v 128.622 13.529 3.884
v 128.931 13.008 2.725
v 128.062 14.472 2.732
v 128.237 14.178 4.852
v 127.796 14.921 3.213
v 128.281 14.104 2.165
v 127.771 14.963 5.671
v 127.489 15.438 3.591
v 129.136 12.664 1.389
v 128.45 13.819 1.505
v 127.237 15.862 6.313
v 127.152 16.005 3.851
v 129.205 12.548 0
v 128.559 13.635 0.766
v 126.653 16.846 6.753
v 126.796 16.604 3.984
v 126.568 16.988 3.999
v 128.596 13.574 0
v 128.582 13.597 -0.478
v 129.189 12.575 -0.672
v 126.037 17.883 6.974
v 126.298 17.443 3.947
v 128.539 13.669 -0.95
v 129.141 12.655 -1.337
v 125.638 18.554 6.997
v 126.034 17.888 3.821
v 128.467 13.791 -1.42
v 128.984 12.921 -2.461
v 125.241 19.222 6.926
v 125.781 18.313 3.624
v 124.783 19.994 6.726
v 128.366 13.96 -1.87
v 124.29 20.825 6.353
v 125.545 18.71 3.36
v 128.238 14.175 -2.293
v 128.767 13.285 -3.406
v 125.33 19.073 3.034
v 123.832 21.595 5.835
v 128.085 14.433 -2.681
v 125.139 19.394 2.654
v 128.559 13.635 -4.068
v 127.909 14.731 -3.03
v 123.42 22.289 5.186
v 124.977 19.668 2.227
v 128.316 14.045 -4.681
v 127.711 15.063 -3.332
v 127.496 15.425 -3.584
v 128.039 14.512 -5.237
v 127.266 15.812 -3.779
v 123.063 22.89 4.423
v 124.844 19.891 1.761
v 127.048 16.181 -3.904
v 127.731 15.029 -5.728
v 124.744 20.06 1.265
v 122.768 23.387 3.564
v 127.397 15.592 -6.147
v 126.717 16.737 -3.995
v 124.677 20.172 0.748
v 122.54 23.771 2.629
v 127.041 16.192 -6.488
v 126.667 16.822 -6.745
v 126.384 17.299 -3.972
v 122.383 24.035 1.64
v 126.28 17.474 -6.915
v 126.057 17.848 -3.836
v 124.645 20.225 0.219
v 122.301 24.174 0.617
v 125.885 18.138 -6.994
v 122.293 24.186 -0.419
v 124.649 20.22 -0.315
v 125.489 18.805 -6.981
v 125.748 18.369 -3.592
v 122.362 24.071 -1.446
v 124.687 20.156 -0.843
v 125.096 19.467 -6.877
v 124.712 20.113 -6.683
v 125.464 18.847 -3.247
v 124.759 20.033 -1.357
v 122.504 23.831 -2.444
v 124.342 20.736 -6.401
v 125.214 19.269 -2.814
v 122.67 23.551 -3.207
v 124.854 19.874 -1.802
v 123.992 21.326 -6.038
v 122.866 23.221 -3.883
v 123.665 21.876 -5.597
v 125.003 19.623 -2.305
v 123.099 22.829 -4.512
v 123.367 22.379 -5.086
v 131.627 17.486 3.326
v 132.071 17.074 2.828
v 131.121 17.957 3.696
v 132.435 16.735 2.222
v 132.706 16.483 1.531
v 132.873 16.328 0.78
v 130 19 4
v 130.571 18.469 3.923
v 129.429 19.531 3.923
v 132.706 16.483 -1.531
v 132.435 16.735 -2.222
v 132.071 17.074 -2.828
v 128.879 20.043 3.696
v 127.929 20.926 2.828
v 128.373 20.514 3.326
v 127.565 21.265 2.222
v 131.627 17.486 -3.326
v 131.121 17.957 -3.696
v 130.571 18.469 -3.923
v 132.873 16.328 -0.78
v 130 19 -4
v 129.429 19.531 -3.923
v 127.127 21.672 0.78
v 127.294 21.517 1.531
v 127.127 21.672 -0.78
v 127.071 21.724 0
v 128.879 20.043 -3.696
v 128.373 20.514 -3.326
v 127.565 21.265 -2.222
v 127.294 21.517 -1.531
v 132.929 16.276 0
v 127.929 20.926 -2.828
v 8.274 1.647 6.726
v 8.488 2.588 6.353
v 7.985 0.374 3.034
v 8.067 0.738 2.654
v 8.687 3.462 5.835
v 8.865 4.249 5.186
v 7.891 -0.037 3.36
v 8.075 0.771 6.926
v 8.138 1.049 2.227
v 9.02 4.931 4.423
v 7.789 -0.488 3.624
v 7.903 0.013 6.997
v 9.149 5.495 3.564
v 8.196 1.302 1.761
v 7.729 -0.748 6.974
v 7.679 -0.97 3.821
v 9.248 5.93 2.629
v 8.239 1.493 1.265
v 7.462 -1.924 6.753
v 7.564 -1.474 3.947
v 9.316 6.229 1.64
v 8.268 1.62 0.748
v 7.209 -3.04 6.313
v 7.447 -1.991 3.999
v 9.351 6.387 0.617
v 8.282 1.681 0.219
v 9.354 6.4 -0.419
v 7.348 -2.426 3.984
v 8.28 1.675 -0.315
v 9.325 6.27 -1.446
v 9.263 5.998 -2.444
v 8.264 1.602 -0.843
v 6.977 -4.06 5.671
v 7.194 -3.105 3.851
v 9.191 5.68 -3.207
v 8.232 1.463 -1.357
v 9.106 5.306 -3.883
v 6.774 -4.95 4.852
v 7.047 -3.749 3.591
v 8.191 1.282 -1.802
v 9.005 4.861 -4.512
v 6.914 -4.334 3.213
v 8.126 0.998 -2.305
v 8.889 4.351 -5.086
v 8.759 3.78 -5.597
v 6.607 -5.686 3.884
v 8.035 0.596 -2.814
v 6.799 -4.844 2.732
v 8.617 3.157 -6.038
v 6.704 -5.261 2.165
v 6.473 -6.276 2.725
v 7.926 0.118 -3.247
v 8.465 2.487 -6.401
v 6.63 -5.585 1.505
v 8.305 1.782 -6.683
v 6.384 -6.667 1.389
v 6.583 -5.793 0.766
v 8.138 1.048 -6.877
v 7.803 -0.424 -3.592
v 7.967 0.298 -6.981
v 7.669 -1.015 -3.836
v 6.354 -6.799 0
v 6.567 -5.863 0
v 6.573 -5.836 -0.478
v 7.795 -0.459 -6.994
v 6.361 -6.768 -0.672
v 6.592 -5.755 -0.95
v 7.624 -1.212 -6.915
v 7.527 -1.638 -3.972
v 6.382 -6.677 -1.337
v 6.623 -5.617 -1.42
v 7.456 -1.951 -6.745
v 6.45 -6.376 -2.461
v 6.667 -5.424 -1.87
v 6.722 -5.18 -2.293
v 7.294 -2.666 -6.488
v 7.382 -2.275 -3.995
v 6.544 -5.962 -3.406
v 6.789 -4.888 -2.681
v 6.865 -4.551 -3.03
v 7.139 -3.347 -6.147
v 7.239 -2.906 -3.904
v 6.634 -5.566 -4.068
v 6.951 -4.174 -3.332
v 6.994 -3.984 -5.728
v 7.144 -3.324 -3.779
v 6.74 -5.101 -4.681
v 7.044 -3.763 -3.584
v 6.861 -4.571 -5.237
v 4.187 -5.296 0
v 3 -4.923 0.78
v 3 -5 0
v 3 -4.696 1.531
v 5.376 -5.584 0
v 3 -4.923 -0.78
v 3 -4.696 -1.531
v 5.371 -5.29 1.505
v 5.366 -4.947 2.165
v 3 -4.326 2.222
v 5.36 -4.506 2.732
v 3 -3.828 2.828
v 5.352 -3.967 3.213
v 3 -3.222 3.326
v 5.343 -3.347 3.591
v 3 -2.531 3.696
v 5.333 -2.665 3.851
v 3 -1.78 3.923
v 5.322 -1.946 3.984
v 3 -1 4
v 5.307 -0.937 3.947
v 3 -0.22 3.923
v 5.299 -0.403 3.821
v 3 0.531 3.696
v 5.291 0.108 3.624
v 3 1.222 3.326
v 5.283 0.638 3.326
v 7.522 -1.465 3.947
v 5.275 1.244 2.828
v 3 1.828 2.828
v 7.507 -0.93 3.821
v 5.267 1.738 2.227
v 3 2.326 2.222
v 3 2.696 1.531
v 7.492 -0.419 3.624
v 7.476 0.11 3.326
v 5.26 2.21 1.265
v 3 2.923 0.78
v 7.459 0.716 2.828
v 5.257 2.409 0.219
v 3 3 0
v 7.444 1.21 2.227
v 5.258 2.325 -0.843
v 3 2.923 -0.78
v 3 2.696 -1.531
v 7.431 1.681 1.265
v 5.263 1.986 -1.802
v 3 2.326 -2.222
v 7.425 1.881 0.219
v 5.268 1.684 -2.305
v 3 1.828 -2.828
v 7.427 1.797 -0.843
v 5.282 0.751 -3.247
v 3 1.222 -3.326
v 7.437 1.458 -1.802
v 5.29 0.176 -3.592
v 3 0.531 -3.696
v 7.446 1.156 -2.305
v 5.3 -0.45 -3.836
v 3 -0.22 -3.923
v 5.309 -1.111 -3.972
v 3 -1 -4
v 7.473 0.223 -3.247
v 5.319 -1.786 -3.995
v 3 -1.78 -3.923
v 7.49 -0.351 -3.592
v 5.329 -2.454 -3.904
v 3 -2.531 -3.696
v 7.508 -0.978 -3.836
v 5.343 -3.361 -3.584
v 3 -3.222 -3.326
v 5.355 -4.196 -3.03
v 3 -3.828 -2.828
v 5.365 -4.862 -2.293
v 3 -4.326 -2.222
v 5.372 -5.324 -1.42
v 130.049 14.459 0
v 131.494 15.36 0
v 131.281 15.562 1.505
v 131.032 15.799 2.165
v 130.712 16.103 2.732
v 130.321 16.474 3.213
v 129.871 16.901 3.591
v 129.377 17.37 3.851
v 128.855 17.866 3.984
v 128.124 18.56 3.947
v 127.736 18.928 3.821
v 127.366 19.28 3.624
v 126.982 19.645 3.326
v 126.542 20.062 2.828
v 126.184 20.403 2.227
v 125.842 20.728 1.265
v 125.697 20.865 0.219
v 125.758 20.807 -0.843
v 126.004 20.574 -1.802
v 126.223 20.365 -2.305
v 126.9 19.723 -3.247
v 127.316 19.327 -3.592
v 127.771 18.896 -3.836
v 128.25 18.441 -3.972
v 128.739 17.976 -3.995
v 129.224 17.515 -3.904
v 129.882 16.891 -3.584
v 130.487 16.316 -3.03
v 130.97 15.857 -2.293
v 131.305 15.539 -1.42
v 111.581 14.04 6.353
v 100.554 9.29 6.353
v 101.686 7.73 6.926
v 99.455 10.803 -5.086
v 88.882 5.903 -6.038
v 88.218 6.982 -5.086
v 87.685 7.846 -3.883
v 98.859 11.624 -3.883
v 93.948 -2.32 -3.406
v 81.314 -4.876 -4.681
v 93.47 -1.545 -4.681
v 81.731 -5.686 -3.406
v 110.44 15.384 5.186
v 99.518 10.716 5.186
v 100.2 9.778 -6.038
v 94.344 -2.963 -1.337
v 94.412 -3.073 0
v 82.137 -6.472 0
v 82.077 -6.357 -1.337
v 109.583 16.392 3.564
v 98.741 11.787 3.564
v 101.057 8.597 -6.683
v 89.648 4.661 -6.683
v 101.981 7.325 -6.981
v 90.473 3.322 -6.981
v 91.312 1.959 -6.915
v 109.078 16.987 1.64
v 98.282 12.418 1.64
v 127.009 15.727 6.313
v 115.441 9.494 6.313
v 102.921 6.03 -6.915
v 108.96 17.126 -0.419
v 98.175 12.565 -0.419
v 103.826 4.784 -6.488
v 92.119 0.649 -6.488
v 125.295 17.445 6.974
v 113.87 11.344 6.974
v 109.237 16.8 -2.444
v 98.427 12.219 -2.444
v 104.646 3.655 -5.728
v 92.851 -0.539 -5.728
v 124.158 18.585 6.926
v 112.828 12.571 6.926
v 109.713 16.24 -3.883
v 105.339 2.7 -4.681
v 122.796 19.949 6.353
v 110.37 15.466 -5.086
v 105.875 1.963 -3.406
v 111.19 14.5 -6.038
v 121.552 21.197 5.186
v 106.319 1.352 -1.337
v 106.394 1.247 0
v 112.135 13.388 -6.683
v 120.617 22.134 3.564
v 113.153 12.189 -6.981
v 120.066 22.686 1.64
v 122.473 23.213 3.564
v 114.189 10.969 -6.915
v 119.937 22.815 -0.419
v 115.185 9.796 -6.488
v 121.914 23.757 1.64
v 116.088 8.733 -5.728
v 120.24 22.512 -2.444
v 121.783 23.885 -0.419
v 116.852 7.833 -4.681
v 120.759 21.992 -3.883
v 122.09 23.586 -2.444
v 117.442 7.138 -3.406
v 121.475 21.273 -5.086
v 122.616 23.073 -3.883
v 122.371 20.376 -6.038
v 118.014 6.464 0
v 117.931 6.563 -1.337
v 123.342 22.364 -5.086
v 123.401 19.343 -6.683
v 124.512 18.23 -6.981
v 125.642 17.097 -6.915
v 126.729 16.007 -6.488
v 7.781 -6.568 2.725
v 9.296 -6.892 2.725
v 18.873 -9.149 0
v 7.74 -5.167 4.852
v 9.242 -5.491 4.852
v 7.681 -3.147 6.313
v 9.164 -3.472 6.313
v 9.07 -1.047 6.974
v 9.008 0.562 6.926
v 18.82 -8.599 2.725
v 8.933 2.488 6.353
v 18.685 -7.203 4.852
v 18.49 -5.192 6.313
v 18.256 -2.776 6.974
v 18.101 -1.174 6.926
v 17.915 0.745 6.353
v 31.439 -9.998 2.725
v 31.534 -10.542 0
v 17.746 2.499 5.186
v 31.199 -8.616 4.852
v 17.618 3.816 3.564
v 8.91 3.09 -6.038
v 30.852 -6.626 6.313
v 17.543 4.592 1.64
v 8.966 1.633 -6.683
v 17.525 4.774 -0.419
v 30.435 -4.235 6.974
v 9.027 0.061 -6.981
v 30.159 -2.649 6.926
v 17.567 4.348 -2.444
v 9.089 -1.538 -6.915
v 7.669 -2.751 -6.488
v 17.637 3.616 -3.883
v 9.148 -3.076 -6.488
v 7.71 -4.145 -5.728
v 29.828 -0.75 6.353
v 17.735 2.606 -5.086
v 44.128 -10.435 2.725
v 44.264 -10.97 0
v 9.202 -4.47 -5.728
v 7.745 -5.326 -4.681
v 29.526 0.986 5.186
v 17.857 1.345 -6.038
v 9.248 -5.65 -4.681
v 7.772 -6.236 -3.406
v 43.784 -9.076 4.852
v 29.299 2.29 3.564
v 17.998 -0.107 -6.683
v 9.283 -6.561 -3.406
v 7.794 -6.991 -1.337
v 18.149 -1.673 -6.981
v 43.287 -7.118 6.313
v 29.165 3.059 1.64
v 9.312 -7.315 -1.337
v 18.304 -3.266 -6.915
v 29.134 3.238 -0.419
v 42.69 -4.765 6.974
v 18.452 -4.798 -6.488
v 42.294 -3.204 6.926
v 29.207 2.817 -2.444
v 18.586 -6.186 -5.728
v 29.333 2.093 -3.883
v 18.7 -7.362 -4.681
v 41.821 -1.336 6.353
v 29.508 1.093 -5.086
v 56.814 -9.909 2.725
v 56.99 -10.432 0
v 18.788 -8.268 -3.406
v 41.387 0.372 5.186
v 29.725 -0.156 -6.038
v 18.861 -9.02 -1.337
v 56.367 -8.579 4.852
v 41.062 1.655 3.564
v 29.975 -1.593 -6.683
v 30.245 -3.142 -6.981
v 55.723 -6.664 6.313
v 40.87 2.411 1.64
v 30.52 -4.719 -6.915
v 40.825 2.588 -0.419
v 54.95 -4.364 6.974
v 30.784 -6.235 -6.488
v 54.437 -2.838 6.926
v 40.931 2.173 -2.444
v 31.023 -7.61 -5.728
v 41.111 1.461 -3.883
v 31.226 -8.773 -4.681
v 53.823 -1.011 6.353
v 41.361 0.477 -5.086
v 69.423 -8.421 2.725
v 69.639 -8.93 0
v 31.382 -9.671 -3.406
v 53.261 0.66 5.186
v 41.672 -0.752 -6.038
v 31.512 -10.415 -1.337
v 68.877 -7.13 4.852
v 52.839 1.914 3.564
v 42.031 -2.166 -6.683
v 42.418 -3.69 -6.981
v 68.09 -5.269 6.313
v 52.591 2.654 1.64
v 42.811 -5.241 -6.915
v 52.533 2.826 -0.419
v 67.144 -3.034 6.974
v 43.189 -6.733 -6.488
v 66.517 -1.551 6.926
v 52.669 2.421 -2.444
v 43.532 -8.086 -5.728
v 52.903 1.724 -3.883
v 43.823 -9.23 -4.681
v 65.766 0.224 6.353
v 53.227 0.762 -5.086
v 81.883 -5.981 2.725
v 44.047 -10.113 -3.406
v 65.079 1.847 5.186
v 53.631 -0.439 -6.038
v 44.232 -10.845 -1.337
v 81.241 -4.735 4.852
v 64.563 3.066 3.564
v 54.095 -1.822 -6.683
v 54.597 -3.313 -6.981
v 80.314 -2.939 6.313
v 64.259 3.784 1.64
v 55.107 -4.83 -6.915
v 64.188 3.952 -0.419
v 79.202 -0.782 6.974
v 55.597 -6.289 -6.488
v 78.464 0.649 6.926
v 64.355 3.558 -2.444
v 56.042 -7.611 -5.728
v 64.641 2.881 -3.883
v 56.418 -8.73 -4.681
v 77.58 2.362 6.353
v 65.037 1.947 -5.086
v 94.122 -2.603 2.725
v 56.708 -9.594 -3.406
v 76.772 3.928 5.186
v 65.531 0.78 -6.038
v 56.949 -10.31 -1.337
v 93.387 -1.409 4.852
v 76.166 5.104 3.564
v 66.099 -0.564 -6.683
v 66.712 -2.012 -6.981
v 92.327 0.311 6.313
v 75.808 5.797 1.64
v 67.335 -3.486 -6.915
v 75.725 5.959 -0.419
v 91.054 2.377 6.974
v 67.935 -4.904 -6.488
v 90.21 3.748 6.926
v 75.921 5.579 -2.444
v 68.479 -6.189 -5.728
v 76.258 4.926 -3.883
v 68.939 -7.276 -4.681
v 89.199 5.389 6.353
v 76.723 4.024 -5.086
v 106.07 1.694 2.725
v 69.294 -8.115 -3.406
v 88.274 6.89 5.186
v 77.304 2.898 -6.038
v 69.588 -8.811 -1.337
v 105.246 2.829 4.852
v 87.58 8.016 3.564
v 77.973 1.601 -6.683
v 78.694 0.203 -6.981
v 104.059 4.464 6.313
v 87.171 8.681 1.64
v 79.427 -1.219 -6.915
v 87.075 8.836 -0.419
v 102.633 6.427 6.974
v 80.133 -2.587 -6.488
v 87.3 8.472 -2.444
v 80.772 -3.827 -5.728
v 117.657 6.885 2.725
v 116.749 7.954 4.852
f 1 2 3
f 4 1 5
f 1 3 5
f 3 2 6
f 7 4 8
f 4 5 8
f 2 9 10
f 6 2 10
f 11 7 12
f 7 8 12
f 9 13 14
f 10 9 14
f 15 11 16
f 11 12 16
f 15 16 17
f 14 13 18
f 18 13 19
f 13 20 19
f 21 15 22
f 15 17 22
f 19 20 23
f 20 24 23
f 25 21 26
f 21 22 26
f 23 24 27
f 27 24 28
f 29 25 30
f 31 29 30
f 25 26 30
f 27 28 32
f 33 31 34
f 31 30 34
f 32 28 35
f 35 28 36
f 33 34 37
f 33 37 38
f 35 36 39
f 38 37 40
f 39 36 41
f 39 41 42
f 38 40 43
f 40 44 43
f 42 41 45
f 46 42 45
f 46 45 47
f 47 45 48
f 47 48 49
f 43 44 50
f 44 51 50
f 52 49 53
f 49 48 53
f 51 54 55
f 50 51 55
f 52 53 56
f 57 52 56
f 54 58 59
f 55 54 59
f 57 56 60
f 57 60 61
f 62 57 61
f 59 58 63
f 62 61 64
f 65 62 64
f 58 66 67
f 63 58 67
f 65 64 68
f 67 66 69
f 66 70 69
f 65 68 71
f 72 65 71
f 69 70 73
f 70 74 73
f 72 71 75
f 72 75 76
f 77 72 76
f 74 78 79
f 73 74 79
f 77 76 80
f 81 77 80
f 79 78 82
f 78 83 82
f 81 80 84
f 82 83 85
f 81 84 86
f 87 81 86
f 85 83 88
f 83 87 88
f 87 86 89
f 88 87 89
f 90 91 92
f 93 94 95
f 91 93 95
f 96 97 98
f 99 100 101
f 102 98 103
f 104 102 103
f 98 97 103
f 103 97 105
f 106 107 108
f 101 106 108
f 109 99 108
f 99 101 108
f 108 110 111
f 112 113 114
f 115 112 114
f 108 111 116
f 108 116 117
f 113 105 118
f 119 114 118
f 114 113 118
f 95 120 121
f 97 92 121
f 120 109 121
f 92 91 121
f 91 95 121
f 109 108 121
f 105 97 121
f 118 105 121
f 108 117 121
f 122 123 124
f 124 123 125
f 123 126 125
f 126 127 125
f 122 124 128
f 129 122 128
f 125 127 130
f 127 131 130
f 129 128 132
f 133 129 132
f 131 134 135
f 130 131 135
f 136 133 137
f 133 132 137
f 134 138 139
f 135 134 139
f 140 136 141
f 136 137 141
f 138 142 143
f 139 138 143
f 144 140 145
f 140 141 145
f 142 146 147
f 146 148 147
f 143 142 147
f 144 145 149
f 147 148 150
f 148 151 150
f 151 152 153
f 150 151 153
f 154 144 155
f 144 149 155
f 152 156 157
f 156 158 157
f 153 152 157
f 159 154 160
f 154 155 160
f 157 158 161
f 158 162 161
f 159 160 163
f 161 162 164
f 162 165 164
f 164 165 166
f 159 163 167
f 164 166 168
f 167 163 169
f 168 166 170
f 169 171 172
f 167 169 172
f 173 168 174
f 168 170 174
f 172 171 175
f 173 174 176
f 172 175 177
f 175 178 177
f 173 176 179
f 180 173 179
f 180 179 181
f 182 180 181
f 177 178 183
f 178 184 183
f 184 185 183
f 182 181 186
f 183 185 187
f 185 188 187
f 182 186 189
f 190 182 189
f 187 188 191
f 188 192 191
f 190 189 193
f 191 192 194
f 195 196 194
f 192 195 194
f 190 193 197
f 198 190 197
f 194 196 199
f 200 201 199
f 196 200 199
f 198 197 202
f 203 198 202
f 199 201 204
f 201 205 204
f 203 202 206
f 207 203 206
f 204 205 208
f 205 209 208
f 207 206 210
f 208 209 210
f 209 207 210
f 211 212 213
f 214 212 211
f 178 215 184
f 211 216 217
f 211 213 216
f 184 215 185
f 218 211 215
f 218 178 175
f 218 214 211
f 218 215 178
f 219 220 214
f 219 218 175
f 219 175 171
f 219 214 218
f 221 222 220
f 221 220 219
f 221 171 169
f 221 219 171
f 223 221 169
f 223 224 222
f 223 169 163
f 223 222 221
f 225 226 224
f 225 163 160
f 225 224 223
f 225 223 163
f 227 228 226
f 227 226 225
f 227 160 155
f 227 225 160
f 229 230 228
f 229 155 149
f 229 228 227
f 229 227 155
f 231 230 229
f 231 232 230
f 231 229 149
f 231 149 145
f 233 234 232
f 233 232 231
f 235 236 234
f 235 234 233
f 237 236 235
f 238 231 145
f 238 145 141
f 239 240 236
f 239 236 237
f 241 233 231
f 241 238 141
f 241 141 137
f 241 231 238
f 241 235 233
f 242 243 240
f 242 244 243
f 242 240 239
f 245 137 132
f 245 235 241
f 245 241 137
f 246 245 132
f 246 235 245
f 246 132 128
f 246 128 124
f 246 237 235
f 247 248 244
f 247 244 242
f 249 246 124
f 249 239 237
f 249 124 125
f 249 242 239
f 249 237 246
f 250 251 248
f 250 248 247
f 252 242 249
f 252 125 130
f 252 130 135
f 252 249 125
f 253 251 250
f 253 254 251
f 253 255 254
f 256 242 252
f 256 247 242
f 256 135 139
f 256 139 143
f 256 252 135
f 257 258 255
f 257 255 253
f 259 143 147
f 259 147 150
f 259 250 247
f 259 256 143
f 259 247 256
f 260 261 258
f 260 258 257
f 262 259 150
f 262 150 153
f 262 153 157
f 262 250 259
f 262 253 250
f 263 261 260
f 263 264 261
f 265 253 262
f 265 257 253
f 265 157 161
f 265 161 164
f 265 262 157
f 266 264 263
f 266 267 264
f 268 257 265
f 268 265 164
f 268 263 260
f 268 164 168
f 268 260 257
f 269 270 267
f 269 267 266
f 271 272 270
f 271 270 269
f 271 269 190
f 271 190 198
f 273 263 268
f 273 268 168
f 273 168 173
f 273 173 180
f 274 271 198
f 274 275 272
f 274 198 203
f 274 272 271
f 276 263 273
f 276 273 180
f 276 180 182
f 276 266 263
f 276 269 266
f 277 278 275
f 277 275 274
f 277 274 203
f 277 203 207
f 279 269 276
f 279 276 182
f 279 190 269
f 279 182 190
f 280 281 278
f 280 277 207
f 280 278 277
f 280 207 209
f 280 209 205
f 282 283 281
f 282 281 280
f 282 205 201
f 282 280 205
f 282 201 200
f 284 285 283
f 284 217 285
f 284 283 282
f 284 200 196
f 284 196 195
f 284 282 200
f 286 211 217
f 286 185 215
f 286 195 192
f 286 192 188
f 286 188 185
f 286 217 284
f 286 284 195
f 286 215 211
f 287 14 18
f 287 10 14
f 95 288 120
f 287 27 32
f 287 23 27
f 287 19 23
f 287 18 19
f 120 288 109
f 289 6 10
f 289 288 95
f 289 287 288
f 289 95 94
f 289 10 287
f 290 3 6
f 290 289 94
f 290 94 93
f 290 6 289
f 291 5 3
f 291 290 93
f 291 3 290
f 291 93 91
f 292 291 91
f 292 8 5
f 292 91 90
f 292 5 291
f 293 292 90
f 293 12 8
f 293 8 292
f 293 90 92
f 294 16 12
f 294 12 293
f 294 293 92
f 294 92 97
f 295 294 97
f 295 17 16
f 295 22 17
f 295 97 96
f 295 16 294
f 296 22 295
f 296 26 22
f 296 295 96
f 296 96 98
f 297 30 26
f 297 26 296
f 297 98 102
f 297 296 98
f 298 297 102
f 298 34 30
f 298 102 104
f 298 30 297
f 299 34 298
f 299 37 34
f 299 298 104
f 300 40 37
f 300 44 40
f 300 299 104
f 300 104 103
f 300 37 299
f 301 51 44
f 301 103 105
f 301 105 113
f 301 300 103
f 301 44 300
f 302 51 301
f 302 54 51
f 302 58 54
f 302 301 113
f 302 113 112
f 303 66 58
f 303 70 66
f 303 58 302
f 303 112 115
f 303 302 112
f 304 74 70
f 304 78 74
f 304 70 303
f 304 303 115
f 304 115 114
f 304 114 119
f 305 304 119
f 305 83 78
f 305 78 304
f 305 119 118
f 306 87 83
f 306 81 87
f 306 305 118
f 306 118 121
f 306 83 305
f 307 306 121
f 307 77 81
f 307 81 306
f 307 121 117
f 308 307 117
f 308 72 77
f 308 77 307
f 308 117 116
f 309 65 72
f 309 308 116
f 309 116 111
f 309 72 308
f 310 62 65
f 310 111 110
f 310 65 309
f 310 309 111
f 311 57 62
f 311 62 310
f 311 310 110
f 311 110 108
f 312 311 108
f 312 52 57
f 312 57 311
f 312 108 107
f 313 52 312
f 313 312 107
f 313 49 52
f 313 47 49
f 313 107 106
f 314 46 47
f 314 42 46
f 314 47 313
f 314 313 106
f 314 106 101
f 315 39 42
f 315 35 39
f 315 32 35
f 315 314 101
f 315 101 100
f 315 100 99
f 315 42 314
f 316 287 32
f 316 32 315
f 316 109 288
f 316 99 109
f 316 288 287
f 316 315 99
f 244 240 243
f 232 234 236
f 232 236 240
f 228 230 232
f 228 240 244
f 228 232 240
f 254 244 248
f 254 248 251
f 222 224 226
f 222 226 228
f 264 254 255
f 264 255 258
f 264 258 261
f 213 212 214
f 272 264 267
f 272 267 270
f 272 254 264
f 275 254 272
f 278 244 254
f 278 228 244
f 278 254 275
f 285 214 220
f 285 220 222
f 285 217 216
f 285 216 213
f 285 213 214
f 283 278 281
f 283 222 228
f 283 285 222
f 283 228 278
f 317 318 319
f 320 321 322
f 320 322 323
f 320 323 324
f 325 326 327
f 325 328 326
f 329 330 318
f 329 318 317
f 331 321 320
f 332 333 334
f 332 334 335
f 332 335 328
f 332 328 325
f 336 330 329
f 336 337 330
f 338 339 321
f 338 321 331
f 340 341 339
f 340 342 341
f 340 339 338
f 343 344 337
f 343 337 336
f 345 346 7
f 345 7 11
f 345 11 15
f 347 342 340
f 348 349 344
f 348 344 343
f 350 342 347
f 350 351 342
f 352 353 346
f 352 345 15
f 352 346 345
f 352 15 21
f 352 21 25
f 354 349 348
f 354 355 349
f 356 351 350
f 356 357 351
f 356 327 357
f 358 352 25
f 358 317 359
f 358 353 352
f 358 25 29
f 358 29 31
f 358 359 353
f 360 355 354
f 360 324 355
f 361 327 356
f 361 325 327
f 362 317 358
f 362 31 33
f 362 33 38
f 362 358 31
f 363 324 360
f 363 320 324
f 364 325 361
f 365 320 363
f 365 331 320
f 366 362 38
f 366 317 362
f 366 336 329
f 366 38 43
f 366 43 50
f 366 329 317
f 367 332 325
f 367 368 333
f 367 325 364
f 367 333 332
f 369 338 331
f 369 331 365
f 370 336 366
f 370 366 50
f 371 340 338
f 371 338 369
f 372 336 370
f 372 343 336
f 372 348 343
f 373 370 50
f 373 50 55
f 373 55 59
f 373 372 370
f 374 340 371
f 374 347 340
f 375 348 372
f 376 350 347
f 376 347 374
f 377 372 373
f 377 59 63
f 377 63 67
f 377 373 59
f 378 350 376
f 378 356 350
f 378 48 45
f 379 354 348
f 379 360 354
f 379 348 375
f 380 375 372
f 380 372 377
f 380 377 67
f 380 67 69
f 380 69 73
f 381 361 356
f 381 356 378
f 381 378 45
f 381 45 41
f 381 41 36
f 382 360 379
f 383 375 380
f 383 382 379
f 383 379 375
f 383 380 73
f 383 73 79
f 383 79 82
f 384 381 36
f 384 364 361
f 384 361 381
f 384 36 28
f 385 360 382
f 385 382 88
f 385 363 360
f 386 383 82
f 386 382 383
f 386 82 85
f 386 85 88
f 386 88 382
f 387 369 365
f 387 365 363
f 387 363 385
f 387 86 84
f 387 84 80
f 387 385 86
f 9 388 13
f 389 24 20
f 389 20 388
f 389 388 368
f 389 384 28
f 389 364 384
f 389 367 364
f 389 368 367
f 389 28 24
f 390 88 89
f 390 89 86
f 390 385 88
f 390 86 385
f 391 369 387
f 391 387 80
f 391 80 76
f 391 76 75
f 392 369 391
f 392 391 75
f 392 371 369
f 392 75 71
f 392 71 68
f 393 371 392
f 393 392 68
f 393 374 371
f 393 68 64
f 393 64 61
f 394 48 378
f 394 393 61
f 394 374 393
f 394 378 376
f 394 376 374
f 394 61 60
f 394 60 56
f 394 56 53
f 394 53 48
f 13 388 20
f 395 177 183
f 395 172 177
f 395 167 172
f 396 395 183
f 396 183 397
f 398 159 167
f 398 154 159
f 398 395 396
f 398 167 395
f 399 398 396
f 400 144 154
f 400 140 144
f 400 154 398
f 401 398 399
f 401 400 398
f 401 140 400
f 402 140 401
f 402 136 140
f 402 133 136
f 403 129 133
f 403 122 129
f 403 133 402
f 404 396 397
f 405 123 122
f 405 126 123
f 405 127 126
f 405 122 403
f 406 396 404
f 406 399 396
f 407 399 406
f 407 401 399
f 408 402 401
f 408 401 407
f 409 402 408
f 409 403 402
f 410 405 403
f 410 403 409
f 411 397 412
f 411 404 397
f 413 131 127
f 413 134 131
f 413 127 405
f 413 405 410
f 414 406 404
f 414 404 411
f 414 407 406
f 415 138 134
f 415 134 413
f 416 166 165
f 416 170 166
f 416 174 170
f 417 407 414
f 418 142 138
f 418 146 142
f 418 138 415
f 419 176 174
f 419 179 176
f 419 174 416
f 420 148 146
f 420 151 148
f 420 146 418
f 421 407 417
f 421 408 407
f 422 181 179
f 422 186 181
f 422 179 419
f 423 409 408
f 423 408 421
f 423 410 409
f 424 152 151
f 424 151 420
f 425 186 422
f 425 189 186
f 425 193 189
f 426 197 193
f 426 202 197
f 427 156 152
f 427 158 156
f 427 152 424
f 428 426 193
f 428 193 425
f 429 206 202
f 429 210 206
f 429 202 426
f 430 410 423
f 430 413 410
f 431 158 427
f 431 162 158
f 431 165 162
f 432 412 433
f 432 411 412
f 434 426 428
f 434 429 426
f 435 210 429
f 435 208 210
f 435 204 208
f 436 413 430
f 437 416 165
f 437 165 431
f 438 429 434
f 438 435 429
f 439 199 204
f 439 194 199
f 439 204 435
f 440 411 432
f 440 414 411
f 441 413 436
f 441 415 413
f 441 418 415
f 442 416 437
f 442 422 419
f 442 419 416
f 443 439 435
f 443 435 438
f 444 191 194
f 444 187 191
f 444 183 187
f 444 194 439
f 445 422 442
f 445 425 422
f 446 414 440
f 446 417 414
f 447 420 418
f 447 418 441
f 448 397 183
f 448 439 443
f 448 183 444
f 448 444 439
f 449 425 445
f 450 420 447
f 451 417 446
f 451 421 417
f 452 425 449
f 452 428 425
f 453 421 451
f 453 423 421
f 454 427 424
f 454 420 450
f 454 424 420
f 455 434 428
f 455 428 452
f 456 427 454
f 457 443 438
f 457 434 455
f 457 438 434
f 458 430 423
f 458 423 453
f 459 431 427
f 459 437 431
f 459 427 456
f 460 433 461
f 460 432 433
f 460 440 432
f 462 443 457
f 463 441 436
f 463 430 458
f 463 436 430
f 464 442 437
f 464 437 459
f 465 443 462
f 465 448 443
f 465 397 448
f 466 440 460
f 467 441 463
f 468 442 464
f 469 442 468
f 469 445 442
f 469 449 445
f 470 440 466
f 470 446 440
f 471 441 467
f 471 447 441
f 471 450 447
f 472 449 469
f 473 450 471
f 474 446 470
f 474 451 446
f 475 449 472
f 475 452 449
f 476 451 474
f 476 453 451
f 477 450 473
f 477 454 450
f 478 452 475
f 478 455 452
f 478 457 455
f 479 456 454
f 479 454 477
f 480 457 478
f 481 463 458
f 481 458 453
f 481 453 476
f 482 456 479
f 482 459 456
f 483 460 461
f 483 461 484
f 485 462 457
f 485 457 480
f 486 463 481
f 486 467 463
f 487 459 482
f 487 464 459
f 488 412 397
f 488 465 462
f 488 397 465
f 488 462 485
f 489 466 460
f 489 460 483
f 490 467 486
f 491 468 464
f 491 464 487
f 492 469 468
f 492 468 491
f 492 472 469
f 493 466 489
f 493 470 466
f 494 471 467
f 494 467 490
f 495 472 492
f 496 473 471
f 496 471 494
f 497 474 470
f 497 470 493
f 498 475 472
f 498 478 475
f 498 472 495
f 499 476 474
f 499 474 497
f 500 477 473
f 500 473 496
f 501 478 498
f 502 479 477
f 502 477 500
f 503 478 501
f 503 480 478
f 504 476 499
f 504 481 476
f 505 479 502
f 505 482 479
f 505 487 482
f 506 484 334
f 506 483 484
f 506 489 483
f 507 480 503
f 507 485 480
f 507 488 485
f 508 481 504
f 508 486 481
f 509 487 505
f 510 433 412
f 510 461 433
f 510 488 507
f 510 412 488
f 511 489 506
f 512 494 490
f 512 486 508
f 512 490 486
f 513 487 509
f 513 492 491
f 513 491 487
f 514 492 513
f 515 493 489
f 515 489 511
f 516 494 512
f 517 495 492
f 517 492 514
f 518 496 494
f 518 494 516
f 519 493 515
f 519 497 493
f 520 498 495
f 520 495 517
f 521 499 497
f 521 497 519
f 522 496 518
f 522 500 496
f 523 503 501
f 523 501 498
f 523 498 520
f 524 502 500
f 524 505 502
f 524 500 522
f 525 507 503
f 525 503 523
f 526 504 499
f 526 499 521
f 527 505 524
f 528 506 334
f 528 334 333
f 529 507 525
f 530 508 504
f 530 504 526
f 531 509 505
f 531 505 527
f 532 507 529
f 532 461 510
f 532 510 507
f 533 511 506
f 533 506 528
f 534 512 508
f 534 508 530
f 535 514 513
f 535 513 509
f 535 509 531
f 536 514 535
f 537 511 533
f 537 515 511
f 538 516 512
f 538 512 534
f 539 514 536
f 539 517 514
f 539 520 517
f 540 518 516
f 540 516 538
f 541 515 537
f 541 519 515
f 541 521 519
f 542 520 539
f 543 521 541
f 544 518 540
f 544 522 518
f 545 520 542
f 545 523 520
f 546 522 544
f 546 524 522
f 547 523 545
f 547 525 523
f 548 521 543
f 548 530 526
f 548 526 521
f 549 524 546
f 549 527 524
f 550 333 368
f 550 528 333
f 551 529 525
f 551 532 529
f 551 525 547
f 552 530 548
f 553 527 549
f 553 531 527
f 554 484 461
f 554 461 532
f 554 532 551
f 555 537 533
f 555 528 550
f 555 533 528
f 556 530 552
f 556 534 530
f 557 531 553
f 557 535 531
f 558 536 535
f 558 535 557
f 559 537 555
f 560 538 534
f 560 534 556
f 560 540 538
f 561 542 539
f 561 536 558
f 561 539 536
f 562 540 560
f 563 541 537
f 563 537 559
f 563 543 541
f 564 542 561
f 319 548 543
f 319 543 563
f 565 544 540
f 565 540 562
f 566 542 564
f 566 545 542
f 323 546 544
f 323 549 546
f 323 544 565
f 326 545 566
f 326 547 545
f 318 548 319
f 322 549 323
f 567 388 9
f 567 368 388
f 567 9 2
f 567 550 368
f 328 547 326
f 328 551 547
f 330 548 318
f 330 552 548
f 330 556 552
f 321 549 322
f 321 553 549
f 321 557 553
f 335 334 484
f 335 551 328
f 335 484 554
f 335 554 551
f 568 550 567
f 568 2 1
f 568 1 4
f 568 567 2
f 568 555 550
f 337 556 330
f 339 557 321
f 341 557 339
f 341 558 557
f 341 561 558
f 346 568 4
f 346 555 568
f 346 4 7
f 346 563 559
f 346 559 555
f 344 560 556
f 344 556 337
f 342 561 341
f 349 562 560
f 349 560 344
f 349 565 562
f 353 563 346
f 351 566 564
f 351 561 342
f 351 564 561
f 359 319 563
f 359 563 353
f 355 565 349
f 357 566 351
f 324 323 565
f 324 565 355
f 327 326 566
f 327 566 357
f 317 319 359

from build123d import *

# Parameters (mm, degrees)
SKETCH042_R      = 4
EXTRUDE025_DEPTH = 30
SKETCH040_R      = 7


with BuildPart() as sweep010:
    # Sweep010: sweep along a path in Sketch
    with BuildLine(Plane.XY) as sweep010_path:
        ThreePointArc((0, 0), (65.583227, -3.22849), (127, 20))
    # Sketch042 → Sweep010 (sweep)
    with BuildSketch(Plane(origin=(0, 0, 0), x_dir=(0, -1, 0), z_dir=(-1, 0, 0))):
        Circle(SKETCH042_R)
    sweep(path=sweep010_path.line)


with BuildPart() as sweep010_1:
    # Sweep010 placement: moved
    add(sweep010.part.moved(Location((0, -2, 0))))


with BuildPart() as extrude025:
    # Sketch041 → Extrude025 (new body)
    with BuildSketch(Plane.XY.offset(-15)):
        Polygon((-8.268976, 21.973037), (10.121624, 21.973037), (-0.555824, -25), (-25.401805, -25), align=None)
        Polygon((105.81268, 45.885295), (155.276998, 45.885295), (207.473539, -4.114705), (135.506671, -4.114705), align=None)
    extrude(amount=EXTRUDE025_DEPTH)


with BuildPart() as motor_tube_outer002:
    # Sweep009: sweep along a path in Sketch
    with BuildLine(Plane.XY) as sweep009_path:
        ThreePointArc((0, 0), (65.583227, -3.22849), (127, 20))
    # Sketch040 → Sweep009 (sweep)
    with BuildSketch(Plane(origin=(0, 0, 0), x_dir=(0, -1, 0), z_dir=(-1, 0, 0))):
        Circle(SKETCH040_R)
    sweep(path=sweep009_path.line)

    # Cut009: cut Extrude025
    add(extrude025.part, mode=Mode.SUBTRACT)

    # Fusion009: union Sweep010
    add(sweep010_1.part)


with BuildPart() as motor_tube_outer002_1:
    # Fusion009 placement: moved
    add(motor_tube_outer002.part.moved(Location((3, 1, 0))))


solid = motor_tube_outer002_1.part
